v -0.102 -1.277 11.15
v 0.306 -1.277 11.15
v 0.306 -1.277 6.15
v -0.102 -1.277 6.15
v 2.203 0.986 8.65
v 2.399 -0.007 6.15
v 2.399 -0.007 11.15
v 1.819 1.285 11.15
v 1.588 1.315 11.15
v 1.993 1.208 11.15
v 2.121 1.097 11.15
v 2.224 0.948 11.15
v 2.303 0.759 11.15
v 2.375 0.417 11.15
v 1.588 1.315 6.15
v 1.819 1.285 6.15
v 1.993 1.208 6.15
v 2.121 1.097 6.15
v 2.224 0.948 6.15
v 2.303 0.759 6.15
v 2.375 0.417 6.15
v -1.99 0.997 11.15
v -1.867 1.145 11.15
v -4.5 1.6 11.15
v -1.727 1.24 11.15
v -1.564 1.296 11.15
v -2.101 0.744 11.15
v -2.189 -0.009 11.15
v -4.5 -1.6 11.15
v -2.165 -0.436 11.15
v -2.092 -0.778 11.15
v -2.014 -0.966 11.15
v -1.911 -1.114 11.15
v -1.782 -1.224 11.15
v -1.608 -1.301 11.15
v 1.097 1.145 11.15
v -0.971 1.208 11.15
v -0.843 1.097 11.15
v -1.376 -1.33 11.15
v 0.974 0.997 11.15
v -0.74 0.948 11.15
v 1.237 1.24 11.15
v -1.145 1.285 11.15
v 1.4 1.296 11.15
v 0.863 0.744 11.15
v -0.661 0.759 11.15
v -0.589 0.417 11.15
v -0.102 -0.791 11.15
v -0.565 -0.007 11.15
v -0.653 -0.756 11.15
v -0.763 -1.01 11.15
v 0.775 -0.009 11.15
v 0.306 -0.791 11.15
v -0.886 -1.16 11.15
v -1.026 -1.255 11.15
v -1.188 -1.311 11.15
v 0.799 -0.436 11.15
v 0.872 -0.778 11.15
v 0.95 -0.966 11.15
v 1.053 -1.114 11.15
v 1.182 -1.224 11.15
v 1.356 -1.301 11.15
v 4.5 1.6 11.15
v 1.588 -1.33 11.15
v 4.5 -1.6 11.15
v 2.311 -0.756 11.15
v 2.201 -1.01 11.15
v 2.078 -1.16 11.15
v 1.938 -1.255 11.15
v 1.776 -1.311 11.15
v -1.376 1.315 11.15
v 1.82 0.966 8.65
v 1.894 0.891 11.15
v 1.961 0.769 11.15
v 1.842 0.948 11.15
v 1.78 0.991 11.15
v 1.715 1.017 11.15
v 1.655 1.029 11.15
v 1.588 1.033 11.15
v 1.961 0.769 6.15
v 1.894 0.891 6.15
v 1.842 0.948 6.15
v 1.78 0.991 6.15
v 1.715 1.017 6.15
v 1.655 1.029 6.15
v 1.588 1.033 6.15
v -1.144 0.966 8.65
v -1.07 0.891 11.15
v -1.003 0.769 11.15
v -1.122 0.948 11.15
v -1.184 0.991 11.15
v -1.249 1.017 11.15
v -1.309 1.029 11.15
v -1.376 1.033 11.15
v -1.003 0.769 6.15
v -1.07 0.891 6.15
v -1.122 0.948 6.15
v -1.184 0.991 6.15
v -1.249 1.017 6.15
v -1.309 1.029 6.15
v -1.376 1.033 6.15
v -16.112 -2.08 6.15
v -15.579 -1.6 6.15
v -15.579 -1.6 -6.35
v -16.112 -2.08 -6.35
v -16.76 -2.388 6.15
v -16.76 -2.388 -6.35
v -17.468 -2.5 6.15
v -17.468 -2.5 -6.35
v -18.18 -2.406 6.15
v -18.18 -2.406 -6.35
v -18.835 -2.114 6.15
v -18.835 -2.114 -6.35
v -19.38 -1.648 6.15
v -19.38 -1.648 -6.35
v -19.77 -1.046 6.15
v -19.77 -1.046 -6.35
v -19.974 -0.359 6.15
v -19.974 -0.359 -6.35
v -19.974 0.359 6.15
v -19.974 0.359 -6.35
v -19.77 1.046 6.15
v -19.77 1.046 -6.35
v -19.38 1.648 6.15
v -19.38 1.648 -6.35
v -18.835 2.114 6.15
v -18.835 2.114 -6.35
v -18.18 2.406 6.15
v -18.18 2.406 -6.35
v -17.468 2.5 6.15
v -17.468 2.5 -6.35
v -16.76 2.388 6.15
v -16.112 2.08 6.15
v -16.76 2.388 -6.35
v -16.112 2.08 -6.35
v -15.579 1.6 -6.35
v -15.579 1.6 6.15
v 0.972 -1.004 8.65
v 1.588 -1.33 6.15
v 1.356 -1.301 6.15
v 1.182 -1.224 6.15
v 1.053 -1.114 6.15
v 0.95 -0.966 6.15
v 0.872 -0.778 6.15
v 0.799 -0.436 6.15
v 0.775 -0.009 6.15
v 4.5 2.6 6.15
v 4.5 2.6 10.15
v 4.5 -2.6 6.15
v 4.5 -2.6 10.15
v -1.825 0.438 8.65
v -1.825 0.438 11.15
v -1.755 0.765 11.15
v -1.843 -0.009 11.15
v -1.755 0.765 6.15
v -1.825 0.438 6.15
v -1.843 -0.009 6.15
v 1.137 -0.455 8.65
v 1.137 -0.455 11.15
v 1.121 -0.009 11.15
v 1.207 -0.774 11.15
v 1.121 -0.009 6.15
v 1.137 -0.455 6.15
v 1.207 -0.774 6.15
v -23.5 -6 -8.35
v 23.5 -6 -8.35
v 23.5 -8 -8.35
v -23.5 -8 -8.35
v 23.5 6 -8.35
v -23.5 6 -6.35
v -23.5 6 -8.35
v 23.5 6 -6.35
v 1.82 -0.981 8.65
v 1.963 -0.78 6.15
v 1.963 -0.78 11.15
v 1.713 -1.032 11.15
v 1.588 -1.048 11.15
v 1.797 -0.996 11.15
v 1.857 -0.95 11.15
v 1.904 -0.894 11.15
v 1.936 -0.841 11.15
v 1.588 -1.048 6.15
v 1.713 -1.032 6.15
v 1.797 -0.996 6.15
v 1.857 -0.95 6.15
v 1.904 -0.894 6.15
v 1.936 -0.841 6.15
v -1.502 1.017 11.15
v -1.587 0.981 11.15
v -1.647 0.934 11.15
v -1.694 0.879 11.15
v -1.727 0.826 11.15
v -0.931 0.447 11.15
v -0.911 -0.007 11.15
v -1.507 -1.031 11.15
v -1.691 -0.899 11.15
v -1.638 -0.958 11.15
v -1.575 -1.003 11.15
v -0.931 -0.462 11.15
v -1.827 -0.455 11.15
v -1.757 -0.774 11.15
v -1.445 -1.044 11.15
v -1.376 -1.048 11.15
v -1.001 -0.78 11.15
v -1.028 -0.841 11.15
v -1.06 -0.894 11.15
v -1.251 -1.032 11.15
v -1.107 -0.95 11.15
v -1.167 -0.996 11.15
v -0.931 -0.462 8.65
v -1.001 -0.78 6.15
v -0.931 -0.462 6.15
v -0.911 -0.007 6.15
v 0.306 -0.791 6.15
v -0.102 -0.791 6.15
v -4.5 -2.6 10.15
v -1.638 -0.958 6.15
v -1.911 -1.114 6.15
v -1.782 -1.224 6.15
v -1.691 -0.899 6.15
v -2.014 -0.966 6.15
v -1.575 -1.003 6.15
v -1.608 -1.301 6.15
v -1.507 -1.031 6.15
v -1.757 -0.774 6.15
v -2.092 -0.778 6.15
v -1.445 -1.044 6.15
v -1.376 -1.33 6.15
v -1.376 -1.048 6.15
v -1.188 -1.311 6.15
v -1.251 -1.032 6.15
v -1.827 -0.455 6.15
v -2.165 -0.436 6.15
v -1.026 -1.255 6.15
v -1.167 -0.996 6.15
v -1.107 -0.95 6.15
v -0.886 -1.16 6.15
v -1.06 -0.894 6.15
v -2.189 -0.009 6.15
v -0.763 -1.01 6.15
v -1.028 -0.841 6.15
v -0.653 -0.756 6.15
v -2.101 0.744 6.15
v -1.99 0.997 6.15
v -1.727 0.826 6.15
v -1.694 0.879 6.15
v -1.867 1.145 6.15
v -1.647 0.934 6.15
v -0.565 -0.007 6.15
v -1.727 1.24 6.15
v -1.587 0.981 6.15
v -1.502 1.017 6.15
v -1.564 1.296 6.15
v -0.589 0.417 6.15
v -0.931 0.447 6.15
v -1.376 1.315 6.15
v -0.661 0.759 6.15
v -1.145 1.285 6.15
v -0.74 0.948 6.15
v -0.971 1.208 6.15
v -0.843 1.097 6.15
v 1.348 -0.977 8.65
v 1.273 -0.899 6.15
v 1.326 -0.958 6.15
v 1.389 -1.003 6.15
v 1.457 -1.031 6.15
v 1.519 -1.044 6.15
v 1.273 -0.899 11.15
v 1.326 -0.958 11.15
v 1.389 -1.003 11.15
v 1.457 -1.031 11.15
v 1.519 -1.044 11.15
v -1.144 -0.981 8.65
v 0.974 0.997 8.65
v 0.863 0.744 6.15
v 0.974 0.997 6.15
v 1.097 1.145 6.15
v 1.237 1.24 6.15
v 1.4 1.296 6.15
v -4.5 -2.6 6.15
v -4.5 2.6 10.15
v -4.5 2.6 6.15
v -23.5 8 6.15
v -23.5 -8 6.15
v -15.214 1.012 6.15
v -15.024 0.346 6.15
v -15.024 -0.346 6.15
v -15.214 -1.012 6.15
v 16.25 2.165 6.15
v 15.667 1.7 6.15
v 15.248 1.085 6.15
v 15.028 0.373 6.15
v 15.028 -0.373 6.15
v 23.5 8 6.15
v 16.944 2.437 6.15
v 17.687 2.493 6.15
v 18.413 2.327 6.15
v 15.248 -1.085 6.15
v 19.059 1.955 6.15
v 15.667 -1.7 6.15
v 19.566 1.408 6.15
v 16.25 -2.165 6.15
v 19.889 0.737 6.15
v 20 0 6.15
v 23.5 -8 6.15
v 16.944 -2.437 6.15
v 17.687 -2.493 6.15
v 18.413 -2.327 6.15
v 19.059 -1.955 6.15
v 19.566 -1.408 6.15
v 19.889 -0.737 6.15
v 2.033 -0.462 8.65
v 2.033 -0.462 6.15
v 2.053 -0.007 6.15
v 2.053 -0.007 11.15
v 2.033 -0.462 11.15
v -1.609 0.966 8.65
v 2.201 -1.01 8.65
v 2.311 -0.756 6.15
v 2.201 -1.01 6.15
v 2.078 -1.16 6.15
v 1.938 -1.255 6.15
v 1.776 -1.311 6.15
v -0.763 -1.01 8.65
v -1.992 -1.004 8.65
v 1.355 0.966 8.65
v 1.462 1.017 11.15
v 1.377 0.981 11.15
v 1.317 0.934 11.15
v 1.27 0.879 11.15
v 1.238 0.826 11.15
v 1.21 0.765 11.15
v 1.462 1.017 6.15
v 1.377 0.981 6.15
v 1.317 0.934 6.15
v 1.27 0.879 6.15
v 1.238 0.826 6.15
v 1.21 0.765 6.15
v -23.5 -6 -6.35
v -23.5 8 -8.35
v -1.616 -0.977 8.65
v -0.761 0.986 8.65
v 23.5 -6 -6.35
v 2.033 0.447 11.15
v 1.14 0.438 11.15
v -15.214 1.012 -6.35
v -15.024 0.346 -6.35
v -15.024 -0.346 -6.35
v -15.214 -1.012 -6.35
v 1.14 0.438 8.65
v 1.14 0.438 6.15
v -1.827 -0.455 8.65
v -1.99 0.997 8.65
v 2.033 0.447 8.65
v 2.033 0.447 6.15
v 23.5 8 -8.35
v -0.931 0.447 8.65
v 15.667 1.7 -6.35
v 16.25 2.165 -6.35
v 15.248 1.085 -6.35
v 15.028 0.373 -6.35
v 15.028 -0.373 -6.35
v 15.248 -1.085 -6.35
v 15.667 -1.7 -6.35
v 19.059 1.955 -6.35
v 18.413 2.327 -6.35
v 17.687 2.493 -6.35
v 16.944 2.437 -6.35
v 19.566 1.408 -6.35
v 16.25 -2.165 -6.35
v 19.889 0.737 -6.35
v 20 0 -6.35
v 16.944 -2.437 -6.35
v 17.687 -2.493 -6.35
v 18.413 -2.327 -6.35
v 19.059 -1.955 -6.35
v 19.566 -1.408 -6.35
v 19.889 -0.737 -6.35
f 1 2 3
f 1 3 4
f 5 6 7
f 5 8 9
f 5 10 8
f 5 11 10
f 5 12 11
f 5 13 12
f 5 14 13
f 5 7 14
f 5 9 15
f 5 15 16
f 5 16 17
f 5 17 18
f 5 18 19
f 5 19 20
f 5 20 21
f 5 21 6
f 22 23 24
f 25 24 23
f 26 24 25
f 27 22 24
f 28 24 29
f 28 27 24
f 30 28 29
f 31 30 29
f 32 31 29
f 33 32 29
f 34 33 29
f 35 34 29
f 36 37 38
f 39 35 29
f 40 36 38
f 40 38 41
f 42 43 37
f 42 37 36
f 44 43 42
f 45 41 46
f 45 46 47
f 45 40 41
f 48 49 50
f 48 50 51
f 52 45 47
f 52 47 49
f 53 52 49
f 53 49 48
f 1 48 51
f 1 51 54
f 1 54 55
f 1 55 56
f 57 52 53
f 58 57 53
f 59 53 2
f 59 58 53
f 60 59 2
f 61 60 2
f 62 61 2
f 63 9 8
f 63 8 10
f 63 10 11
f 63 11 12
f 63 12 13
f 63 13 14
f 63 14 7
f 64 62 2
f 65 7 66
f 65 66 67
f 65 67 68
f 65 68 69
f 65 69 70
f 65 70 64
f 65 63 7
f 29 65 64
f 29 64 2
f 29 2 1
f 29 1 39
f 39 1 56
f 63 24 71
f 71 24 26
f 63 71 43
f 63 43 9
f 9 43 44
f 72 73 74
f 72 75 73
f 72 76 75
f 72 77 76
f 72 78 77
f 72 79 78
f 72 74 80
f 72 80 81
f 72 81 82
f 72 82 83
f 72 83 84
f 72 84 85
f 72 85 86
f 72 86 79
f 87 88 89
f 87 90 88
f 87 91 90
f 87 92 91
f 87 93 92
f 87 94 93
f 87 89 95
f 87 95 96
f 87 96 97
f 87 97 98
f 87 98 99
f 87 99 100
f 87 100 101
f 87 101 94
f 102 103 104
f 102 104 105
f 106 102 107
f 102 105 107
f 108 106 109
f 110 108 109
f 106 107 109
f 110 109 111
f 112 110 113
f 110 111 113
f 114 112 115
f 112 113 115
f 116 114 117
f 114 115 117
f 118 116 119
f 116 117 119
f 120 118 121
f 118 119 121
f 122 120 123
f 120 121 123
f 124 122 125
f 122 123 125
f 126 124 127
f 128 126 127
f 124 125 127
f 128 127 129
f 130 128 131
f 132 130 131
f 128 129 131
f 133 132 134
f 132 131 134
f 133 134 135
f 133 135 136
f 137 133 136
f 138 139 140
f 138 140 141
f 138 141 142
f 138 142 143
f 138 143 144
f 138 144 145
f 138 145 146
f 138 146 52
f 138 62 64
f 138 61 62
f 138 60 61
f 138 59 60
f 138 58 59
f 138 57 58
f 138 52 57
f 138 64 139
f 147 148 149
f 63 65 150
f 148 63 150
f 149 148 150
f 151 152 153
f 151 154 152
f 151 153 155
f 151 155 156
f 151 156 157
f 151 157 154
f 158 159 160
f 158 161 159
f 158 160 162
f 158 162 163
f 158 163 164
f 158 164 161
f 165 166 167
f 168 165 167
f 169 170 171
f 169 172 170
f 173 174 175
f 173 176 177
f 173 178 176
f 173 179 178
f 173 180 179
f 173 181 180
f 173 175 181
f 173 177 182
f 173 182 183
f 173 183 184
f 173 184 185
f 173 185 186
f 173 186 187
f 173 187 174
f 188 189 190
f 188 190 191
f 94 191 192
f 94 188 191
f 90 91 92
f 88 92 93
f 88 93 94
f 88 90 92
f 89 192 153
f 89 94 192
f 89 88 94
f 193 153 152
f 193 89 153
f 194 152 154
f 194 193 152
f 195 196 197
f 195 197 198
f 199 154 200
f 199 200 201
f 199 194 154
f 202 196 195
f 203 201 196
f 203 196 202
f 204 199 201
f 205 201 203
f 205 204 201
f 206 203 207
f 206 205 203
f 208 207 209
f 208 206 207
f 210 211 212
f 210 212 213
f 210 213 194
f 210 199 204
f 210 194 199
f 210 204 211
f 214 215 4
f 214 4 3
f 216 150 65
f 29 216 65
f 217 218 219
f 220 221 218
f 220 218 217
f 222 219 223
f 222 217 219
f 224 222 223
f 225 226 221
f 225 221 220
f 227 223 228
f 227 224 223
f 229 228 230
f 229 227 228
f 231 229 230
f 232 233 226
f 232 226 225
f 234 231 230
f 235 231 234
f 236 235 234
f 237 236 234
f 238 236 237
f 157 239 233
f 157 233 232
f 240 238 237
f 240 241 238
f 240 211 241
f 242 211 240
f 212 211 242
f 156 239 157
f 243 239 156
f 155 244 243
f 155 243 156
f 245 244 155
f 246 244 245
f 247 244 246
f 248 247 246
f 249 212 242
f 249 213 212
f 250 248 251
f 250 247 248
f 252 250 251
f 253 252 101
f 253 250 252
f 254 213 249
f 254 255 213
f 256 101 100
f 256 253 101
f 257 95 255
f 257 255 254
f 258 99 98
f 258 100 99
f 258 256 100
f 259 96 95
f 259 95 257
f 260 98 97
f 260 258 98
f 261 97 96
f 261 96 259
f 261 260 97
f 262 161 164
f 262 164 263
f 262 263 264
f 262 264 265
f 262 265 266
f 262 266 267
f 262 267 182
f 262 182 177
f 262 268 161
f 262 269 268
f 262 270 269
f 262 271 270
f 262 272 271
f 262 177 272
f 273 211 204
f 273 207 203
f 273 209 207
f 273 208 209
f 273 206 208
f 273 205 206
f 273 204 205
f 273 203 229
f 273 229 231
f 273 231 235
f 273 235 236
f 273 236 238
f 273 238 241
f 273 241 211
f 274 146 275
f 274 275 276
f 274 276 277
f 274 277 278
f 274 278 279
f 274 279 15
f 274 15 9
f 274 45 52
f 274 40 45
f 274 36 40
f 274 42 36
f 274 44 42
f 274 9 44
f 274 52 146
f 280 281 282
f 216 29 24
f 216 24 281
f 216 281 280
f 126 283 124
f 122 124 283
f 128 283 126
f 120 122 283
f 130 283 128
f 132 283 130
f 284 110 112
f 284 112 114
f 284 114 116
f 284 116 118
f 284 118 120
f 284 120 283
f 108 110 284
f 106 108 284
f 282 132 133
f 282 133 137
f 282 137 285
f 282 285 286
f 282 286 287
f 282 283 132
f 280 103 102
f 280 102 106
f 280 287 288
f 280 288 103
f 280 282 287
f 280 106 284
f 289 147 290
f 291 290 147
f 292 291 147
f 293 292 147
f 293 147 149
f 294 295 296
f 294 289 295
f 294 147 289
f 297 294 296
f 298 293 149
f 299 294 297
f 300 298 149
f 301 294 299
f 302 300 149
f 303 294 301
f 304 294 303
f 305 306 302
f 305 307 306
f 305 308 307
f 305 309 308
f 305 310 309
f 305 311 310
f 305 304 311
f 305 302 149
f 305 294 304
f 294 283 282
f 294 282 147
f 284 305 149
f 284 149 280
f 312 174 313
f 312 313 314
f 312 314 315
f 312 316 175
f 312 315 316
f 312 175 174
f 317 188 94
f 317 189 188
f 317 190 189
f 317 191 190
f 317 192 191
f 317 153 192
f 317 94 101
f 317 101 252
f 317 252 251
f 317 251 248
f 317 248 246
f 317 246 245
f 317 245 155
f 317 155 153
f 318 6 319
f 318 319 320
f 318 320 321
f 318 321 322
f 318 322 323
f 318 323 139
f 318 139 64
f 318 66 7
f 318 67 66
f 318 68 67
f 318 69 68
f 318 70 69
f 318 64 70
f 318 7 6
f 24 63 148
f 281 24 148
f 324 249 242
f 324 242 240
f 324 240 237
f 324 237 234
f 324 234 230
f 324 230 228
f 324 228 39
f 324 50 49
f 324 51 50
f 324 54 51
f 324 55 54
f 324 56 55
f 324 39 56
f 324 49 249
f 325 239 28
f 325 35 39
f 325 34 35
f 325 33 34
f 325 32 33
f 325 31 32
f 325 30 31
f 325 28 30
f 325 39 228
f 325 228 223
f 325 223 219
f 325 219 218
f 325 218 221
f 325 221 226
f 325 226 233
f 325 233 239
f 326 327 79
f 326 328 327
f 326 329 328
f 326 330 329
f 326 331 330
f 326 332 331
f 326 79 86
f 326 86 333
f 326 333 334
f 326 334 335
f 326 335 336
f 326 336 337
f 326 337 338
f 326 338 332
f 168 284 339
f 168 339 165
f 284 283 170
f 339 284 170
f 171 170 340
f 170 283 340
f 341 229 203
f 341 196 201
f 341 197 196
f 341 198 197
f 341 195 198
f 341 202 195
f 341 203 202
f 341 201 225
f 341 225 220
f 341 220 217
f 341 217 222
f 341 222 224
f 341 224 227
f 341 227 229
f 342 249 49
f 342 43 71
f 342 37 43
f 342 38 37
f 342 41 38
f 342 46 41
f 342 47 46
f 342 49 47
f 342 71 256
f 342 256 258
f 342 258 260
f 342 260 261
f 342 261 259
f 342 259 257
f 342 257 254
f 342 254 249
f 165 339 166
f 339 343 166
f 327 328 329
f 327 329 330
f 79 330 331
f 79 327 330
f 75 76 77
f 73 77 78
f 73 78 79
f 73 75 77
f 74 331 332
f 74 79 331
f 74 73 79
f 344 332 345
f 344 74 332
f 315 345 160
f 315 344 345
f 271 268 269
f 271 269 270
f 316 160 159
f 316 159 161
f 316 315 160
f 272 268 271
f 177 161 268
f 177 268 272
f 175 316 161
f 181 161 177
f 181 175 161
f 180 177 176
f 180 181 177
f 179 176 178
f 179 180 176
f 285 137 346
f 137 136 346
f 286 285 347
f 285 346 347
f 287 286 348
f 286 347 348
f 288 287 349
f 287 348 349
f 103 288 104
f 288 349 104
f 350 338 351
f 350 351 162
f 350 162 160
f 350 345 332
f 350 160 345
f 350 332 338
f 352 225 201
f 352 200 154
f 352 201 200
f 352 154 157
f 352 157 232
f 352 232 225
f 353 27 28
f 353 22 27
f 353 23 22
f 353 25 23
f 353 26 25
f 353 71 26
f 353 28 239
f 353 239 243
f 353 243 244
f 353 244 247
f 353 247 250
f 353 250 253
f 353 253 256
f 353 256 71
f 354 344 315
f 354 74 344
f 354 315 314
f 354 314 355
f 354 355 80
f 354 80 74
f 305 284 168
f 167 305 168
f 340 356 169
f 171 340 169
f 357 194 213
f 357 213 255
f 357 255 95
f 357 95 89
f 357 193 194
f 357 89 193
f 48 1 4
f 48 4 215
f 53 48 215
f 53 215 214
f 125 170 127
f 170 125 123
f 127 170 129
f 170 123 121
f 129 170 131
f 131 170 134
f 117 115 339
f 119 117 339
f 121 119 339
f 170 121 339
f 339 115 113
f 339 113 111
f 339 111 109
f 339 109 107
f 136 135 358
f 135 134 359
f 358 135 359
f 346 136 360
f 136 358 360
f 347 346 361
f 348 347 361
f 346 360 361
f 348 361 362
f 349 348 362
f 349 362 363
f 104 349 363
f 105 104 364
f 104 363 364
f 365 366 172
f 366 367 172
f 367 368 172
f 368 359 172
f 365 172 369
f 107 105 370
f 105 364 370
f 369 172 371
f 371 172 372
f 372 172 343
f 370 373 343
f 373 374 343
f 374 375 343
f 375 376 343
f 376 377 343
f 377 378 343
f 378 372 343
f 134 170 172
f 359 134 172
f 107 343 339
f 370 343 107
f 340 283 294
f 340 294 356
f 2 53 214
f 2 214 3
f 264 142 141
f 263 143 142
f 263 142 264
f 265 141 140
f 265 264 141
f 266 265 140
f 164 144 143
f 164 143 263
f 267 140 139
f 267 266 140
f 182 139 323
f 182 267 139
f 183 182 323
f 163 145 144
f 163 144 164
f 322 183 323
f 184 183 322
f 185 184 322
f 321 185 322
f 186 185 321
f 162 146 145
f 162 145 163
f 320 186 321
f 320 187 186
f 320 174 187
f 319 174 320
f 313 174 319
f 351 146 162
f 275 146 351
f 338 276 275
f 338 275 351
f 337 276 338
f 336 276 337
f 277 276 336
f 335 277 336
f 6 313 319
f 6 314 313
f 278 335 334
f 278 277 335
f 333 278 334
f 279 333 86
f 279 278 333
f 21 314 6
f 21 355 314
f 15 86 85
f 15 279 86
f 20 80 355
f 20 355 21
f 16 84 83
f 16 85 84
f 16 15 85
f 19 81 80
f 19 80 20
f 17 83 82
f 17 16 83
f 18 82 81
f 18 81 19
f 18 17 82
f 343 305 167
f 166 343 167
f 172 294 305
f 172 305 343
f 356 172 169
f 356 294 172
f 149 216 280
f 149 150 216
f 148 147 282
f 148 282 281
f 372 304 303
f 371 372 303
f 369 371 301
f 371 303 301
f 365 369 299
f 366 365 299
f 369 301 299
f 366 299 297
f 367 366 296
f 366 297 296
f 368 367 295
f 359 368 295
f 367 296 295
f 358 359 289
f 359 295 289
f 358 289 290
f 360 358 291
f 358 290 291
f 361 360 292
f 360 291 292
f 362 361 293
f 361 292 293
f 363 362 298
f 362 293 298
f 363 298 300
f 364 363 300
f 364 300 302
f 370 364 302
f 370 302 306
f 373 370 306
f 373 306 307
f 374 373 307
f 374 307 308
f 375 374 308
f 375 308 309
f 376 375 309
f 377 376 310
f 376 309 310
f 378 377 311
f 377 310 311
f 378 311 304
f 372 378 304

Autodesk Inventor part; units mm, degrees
ref_plane "YZ Plane" through (0, 0, 0) normal (1, 0, 0) x (0, 1, 0)
ref_plane "XZ Plane" through (0, 0, 0) normal (0, 1, 0) x (-1, 0, 0)
ref_plane "XY Plane" through (0, 0, 0) normal (0, 0, 1) x (1, 0, 0)
ref_plane "작업 평면1" through (23.5, -8, -2) normal (1, 0, 0) x (0, 0, -1)
sketch "스케치1" plane through (23.5, -8, -2) normal (1, 0, 0) x (0, 0, -1)
  line L0 (0, 16) -> (-8.15, 16) projected
  line L1 (-8.15, 16) -> (-8.15, 10.6) projected
  line L2 (-8.15, 10.6) -> (-12.15, 10.6) projected
  line L3 (-13.15, 9.6) -> (-12.15, 10.6) projected
  line L4 (-13.15, 9.6) -> (-13.15, 6.4) projected
  line L5 (-12.15, 5.4) -> (-13.15, 6.4) projected
  line L6 (-12.15, 5.4) -> (-8.15, 5.4) projected
  line L7 (-8.15, 5.4) -> (-8.15, 0) projected
  line L8 (-8.15, 0) -> (0, 0) projected
  line L9 (0, 16) -> (6.35, 16)
  line L10 (6.35, 16) -> (6.35, 15)
  line L11 (4.35, 14) -> (4.35, 2)
  line L12 (4.35, 14) -> (5.35, 14)
  line L13 (0, 0) -> (6.35, 0)
  line L14 (6.35, 0) -> (6.35, 1)
  line L15 (4.35, 2) -> (5.35, 2)
  line L16 (0, 16) -> (-8.15, 16)
  line L17 (-8.15, 10.6) -> (-12.15, 10.6) projected
  line L18 (-8.15, 10.6) -> (-12.15, 10.6)
  line L19 (-12.15, 10.6) -> (-13.15, 9.6)
  line L20 (-13.15, 6.4) -> (-12.15, 5.4)
  line L21 (5.35, 14) -> (6.35, 14)
  line L22 (6.35, 14) -> (6.35, 15)
  line L23 (5.35, 2) -> (6.35, 2)
  line L24 (6.35, 2) -> (6.35, 1)
  point P0 (-2, 8)
  dimension "d1" = 6.35
sketch "스케치2" plane through (-23.5, 8, 6.15) normal (0, 0, 1) x (1, 0, 0)
  arc A0 (7.9209, -9.6) -> (7.9209, -6.4) centre (6, -8) ccw projected
  line L0 (39.0791, -9.6) -> (7.9209, -9.6) projected
  circle A1 centre (6, -8) radius 2.5
  circle A2 centre (41, -8) radius 2.5 projected
  circle A3 centre (41, -8) radius 2.5
  point P0 (23.5, -8)
  point P1 (7.9209, -6.4)
extrude "돌출1" add sketch "스케치1" against normal up to surface (47 mm away)
extrude "돌출2" cut sketch "스케치2" along normal mid plane 50
sketch "스케치3" plane through (-15.5791, 1.6, 11.15) normal (0, 0, 1) x (1, 0, 0)
  line L0 (15.5791, -14.4593) -> (15.5791, 15.5737)
  line L1 (-7.9209, 4.4) -> (-7.9209, -7.6) projected
  line L2 (-7.9209, 4.4) -> (11.0791, 4.4)
  line L3 (11.0791, 4.4) -> (11.0791, -7.6)
  line L4 (11.0791, -7.6) -> (-7.9209, -7.6)
  line L5 (-7.9209, -7.6) -> (-7.9209, 4.4)
  line L6 (39.0791, 4.4) -> (39.0791, -7.6)
  line L7 (39.0791, 4.4) -> (20.0791, 4.4)
  line L8 (20.0791, 4.4) -> (20.0791, -7.6)
  line L9 (20.0791, -7.6) -> (39.0791, -7.6)
  line L10 (39.0791, -7.6) -> (39.0791, 4.4)
  point P0 (15.5791, -1.6)
  dimension "d9" = 19
extrude "돌출3" cut sketch "스케치3" against normal up to surface (5 mm away)
sketch "스케치4" plane through (-4.5, 1.6, 11.15) normal (0, 0, 1) x (1, 0, 0)
  line L0 (2.1691, -0.2851) -> (8.7999, -0.2851) construction
  line L1 (8.7999, -0.2851) -> (8.7999, -2.6545) construction
  line L2 (8.7999, -2.6545) -> (2.1691, -2.6545) construction
  line L3 (2.1691, -2.6545) -> (2.1691, -0.2851) construction
  spline S0 degree 2 poles (3.9352, -1.6066) (3.9352, -2.29) (3.5379, -2.9301) (3.1242, -2.9301) knots 0 0 0 1 2 2 2
  spline S1 degree 2 poles (3.1242, -2.9301) (2.7043, -2.9301) (2.3111, -2.2776) (2.3111, -1.6087) knots 0 0 0 1 2 2 2
  spline S2 degree 2 poles (2.3111, -1.6087) (2.3111, -0.9212) (2.7084, -0.2851) (3.1242, -0.2851) knots 0 0 0 1 2 2 2
  spline S3 degree 2 poles (3.1242, -0.2851) (3.542, -0.2851) (3.9352, -0.9438) (3.9352, -1.6066) knots 0 0 0 1 2 2 2
  spline S4 degree 2 poles (3.4988, -2.3805) (3.5482, -2.255) (3.5894, -1.868) (3.5894, -1.6066) knots 0 0 0 1 2 2 2
  spline S5 degree 2 poles (3.5894, -1.6066) (3.5894, -1.3452) (3.5482, -0.9603) (3.4967, -0.8306) knots 0 0 0 1 2 2 2
  spline S6 degree 2 poles (3.4967, -0.8306) (3.4453, -0.7009) (3.2662, -0.5671) (3.1242, -0.5671) knots 0 0 0 1 2 2 2
  spline S7 degree 2 poles (3.1242, -0.5671) (2.9822, -0.5671) (2.799, -0.7009) (2.7454, -0.8347) knots 0 0 0 1 2 2 2
  spline S8 degree 2 poles (2.7454, -0.8347) (2.694, -0.9644) (2.6569, -1.3596) (2.6569, -1.6087) knots 0 0 0 1 2 2 2
  spline S9 degree 2 poles (2.6569, -1.6087) (2.6569, -1.8762) (2.6899, -2.2344) (2.7434, -2.3744) knots 0 0 0 1 2 2 2
  spline S10 degree 2 poles (2.7434, -2.3744) (2.7928, -2.5061) (2.976, -2.6481) (3.1242, -2.6481) knots 0 0 0 1 2 2 2
  spline S11 degree 2 poles (3.1242, -2.6481) (3.2641, -2.6481) (3.4473, -2.5143) (3.4988, -2.3805) knots 0 0 0 1 2 2 2
  line L4 (4.8058, -2.8766) -> (4.3983, -2.8766)
  line L5 (4.3983, -2.8766) -> (4.3983, -2.3908)
  line L6 (4.3983, -2.3908) -> (4.8058, -2.3908)
  line L7 (4.8058, -2.3908) -> (4.8058, -2.8766)
  spline S12 degree 2 poles (6.8992, -1.6066) (6.8992, -2.29) (6.5019, -2.9301) (6.0882, -2.9301) knots 0 0 0 1 2 2 2
  spline S13 degree 2 poles (6.0882, -2.9301) (5.6683, -2.9301) (5.2752, -2.2776) (5.2752, -1.6087) knots 0 0 0 1 2 2 2
  spline S14 degree 2 poles (5.2752, -1.6087) (5.2752, -0.9212) (5.6724, -0.2851) (6.0882, -0.2851) knots 0 0 0 1 2 2 2
  spline S15 degree 2 poles (6.0882, -0.2851) (6.506, -0.2851) (6.8992, -0.9438) (6.8992, -1.6066) knots 0 0 0 1 2 2 2
  spline S16 degree 2 poles (6.4628, -2.3805) (6.5122, -2.255) (6.5534, -1.868) (6.5534, -1.6066) knots 0 0 0 1 2 2 2
  spline S17 degree 2 poles (6.5534, -1.6066) (6.5534, -1.3452) (6.5122, -0.9603) (6.4608, -0.8306) knots 0 0 0 1 2 2 2
  spline S18 degree 2 poles (6.4608, -0.8306) (6.4093, -0.7009) (6.2302, -0.5671) (6.0882, -0.5671) knots 0 0 0 1 2 2 2
  spline S19 degree 2 poles (6.0882, -0.5671) (5.9462, -0.5671) (5.763, -0.7009) (5.7095, -0.8347) knots 0 0 0 1 2 2 2
  spline S20 degree 2 poles (5.7095, -0.8347) (5.658, -0.9644) (5.621, -1.3596) (5.621, -1.6087) knots 0 0 0 1 2 2 2
  spline S21 degree 2 poles (5.621, -1.6087) (5.621, -1.8762) (5.6539, -2.2344) (5.7074, -2.3744) knots 0 0 0 1 2 2 2
  spline S22 degree 2 poles (5.7074, -2.3744) (5.7568, -2.5061) (5.94, -2.6481) (6.0882, -2.6481) knots 0 0 0 1 2 2 2
  spline S23 degree 2 poles (6.0882, -2.6481) (6.2282, -2.6481) (6.4114, -2.5143) (6.4628, -2.3805) knots 0 0 0 1 2 2 2
  point P0 (4.5, -1.6)
extrude "돌출4" cut sketch "스케치4" against normal blind 5
properties part number "Bearing Spacer_V2_0mm"
